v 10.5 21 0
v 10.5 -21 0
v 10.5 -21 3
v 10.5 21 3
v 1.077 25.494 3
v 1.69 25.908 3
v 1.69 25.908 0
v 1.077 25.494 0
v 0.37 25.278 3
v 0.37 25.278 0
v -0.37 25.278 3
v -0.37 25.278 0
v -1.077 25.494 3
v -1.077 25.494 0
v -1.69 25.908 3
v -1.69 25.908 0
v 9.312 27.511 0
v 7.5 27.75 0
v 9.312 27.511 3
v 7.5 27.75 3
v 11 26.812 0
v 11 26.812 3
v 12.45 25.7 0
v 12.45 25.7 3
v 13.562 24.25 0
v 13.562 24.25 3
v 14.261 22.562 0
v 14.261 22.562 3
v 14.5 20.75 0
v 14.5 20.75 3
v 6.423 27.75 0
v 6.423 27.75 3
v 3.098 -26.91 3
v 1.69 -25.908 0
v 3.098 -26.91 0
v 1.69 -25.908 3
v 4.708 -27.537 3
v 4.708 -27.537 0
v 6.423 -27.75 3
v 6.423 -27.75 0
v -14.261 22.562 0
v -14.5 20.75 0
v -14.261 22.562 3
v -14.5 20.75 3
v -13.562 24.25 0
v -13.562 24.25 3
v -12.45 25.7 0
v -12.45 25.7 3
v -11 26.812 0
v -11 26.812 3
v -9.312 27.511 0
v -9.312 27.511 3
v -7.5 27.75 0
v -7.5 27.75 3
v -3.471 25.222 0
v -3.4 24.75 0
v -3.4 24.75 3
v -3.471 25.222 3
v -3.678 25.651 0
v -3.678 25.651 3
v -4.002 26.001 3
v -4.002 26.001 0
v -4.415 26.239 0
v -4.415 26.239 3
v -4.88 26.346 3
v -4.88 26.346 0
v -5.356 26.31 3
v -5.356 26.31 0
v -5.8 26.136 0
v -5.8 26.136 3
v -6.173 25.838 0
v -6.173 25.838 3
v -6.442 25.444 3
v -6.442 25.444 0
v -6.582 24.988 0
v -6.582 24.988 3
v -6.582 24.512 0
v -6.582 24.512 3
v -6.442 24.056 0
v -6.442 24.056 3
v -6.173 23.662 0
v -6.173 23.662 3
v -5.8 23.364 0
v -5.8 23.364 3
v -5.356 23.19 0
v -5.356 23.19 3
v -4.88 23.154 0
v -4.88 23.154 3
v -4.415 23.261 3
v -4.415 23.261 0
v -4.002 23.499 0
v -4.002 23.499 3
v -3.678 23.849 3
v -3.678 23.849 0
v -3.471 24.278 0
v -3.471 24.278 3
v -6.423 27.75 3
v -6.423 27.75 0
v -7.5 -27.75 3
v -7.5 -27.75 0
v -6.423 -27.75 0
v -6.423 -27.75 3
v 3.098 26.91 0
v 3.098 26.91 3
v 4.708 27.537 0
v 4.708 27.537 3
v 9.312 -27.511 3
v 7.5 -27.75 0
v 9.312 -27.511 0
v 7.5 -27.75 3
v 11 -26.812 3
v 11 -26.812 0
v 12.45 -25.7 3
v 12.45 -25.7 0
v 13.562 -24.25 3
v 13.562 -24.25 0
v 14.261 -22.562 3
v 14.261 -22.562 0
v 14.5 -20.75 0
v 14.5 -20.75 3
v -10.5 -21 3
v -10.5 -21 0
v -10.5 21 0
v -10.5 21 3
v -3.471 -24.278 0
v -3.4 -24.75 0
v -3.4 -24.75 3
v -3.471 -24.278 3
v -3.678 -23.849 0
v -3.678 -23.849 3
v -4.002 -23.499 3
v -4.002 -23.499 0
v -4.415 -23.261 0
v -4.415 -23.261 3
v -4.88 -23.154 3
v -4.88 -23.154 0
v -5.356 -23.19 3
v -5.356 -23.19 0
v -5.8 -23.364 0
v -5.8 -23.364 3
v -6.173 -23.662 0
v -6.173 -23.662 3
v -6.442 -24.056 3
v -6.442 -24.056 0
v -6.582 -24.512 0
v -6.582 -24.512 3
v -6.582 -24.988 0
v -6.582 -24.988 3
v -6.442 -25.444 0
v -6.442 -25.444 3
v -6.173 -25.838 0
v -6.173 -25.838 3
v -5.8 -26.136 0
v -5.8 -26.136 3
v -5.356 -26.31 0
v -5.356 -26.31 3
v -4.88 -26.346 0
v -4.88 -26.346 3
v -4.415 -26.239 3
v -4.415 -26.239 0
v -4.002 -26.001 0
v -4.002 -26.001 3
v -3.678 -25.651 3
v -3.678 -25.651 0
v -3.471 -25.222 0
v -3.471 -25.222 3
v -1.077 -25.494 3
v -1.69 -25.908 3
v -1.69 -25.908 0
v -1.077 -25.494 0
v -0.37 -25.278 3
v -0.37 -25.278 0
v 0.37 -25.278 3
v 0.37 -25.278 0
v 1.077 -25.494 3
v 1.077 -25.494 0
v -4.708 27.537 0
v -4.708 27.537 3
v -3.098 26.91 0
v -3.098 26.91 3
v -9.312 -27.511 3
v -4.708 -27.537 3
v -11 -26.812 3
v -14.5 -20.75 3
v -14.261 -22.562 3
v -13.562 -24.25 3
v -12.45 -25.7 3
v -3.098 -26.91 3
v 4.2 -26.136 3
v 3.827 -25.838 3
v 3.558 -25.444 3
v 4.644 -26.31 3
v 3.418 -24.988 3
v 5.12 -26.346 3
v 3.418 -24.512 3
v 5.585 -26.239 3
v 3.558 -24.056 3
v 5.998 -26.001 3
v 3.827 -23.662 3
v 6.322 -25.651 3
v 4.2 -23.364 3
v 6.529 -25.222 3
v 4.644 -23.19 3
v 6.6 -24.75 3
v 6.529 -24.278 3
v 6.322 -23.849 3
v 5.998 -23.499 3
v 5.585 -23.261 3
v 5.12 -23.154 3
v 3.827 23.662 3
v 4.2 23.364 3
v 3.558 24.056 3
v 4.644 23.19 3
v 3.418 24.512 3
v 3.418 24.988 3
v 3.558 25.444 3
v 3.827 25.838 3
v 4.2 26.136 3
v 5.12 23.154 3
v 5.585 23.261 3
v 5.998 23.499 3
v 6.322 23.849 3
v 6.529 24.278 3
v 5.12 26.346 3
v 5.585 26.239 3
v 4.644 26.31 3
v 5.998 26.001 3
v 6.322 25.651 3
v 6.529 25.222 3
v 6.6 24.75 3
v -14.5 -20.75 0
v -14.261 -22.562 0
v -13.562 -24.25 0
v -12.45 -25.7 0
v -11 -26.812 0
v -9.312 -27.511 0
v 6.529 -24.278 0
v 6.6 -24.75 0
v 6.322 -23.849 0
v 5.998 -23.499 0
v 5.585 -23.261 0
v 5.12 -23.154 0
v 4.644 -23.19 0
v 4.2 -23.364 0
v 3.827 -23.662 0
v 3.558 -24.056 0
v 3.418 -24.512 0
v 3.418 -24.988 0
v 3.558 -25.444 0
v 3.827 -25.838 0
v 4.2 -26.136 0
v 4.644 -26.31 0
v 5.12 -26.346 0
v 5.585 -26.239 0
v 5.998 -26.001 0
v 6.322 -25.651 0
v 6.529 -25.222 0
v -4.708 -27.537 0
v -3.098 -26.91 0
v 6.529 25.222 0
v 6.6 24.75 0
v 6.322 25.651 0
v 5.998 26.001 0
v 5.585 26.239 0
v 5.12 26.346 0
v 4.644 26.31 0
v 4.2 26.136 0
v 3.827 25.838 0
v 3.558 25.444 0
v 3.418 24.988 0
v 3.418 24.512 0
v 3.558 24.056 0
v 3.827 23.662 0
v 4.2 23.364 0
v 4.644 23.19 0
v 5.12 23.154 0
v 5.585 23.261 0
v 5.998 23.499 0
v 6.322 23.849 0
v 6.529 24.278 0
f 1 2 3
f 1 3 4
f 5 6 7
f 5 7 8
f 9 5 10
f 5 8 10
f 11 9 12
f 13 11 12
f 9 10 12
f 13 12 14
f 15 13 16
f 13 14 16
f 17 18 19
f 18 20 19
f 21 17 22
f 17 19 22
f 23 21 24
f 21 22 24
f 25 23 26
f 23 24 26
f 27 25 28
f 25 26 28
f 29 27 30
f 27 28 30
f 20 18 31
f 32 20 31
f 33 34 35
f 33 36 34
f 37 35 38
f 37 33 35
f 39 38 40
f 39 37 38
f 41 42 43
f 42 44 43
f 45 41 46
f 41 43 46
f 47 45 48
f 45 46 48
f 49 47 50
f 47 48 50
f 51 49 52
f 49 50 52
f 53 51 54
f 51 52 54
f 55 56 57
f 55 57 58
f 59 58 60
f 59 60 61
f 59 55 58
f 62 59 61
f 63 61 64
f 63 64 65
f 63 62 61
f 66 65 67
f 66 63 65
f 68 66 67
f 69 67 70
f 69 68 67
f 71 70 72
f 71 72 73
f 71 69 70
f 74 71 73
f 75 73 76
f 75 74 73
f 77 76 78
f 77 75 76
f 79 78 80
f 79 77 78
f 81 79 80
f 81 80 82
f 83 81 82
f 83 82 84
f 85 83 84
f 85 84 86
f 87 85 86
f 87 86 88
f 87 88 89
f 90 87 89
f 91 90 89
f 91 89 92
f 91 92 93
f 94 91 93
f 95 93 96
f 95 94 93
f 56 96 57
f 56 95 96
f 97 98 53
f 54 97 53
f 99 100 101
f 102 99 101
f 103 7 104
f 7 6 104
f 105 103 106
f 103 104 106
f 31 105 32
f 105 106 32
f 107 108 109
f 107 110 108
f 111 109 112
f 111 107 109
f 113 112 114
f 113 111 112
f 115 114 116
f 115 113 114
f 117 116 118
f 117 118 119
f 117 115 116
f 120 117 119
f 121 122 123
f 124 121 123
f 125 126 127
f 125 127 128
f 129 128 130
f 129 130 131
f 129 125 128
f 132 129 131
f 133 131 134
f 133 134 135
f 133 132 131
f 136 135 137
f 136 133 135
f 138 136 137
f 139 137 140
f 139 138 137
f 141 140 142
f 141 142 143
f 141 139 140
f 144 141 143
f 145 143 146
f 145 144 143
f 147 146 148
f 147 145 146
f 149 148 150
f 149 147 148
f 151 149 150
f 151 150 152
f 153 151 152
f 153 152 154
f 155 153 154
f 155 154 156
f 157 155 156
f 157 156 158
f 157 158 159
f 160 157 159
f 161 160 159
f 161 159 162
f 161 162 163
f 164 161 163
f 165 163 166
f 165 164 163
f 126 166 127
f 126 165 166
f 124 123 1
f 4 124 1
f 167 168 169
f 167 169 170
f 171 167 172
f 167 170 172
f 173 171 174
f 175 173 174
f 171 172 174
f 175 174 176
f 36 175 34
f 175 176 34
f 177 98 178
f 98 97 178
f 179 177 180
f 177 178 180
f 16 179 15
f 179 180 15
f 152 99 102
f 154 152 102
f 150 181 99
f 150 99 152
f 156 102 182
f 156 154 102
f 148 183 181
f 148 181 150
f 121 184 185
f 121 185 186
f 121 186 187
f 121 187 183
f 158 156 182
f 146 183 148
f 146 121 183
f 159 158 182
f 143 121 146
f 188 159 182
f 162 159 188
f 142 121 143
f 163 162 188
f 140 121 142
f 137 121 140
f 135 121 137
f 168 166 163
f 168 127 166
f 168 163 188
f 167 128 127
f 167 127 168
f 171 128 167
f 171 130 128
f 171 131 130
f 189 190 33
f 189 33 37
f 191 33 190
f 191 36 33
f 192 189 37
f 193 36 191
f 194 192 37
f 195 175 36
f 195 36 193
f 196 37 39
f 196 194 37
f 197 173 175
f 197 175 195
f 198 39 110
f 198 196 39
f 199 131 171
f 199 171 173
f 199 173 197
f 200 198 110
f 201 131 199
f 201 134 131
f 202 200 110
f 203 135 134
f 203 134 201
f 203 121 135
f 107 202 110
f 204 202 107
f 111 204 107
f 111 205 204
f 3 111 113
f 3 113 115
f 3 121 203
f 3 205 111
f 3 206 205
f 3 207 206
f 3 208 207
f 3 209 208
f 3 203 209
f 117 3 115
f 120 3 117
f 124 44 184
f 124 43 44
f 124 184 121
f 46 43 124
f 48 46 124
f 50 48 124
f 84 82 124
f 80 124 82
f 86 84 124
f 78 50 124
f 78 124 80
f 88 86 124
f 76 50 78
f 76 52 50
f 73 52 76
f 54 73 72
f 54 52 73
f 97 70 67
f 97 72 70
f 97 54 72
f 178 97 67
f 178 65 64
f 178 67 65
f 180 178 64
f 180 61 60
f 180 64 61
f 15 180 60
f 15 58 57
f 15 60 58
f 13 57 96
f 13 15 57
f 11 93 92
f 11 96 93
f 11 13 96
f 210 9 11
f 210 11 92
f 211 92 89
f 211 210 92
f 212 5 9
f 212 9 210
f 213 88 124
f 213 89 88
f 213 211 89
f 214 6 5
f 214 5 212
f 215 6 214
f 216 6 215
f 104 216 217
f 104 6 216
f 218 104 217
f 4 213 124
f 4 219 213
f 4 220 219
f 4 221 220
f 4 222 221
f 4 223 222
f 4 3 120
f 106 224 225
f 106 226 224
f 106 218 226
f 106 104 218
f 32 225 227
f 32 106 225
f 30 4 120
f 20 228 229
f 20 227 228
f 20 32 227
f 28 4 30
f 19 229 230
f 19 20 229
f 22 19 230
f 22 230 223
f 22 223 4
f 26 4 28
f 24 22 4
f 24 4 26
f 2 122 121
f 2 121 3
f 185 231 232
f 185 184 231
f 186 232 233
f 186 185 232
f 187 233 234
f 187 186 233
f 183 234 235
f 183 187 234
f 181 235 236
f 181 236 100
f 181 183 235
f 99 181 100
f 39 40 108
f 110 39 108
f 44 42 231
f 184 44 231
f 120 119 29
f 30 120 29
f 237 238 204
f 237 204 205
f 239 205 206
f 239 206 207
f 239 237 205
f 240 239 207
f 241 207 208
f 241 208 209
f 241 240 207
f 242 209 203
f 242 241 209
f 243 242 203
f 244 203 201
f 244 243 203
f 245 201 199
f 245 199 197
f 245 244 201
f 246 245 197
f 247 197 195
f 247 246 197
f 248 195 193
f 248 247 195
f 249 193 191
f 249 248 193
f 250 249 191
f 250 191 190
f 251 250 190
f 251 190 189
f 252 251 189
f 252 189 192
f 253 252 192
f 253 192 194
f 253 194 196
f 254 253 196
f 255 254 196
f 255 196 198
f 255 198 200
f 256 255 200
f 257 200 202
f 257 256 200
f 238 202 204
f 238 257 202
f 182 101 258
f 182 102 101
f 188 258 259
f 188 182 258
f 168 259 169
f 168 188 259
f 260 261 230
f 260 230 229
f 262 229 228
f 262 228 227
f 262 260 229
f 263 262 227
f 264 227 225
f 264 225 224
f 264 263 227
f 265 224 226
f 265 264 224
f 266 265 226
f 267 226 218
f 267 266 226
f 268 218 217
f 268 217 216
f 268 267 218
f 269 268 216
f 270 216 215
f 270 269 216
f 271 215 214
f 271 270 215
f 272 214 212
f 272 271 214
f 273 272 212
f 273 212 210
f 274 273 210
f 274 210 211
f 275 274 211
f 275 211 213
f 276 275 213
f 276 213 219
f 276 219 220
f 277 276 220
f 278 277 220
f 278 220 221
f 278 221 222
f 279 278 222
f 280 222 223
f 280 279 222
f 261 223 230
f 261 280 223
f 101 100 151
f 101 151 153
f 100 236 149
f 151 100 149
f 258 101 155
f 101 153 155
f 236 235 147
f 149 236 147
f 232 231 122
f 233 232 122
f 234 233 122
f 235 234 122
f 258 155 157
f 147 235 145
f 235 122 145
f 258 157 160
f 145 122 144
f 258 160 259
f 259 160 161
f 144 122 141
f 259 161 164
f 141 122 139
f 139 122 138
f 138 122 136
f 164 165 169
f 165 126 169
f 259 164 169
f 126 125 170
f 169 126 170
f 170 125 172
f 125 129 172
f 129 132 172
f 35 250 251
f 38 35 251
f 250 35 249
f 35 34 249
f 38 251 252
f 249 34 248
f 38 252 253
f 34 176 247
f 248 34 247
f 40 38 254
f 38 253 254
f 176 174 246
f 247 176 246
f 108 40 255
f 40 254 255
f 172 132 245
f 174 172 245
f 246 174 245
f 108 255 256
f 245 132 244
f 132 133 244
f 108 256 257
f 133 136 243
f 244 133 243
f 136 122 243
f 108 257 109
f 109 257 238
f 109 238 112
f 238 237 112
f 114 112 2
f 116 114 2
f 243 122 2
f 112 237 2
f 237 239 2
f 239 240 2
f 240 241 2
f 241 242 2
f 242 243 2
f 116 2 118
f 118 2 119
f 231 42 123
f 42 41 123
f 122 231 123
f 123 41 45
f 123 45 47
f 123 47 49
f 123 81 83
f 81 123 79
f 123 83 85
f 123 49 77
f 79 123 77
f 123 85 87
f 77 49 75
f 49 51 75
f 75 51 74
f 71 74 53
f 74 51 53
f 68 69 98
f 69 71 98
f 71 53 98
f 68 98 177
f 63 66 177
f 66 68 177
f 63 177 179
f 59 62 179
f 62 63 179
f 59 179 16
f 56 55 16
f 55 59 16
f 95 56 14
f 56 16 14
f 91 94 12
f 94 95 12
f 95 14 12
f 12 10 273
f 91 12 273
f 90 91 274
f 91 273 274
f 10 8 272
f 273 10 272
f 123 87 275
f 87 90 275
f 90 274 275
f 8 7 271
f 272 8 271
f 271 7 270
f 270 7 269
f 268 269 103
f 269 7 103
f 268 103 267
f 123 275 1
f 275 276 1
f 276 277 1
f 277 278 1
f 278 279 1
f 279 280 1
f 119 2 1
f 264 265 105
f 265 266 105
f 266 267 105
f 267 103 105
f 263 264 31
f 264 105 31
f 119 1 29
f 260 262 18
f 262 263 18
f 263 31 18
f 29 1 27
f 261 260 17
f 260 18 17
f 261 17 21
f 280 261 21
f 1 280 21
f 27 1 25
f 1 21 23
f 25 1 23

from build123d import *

# Parameters (mm, degrees)
ESBO_O1_R                = 1.6
ESBO_O1_W                = 21
ESBO_O1_H                = 42
RESSALTO_EXTRUS_O1_DEPTH = 3
FILETE1_R                = 7


with BuildPart() as part:
    # Esboço1 → Ressalto-extrusão1 (new body)
    with BuildSketch(Plane.XY):
        with BuildLine():
            Line((-14.5, 27.75), (-14.5, -27.75))
            Line((-14.5, -27.75), (-2.5, -27.75))
            ThreePointArc((-2.5, -27.75), (0, -25.25), (2.5, -27.75))
            Line((2.5, -27.75), (14.5, -27.75))
            Line((14.5, -27.75), (14.5, 27.75))
            Line((14.5, 27.75), (2.5, 27.75))
            ThreePointArc((2.5, 27.75), (0, 25.25), (-2.5, 27.75))
            Line((-2.5, 27.75), (-14.5, 27.75))
        make_face()
        with Locations((-5, -24.75)):
            Circle(ESBO_O1_R, mode=Mode.SUBTRACT)
        with Locations((5, -24.75)):
            Circle(ESBO_O1_R, mode=Mode.SUBTRACT)
        Rectangle(ESBO_O1_W, ESBO_O1_H, mode=Mode.SUBTRACT)
        with Locations((-5, 24.75)):
            Circle(ESBO_O1_R, mode=Mode.SUBTRACT)
        with Locations((5, 24.75)):
            Circle(ESBO_O1_R, mode=Mode.SUBTRACT)
    extrude(amount=RESSALTO_EXTRUS_O1_DEPTH)

    # Filete1
    filete1_edges = [part.edges().sort_by_distance(p)[0] for p in [
        (-14.5, -27.75, 1.5),
        (-14.5, 27.75, 1.5),
        (-2.5, 27.75, 1.5),
        (2.5, 27.75, 1.5),
        (14.5, 27.75, 1.5),
        (14.5, -27.75, 1.5),
        (2.5, -27.75, 1.5),
        (-2.5, -27.75, 1.5),
    ]]
    fillet(filete1_edges, radius=FILETE1_R)


solid = part.part
